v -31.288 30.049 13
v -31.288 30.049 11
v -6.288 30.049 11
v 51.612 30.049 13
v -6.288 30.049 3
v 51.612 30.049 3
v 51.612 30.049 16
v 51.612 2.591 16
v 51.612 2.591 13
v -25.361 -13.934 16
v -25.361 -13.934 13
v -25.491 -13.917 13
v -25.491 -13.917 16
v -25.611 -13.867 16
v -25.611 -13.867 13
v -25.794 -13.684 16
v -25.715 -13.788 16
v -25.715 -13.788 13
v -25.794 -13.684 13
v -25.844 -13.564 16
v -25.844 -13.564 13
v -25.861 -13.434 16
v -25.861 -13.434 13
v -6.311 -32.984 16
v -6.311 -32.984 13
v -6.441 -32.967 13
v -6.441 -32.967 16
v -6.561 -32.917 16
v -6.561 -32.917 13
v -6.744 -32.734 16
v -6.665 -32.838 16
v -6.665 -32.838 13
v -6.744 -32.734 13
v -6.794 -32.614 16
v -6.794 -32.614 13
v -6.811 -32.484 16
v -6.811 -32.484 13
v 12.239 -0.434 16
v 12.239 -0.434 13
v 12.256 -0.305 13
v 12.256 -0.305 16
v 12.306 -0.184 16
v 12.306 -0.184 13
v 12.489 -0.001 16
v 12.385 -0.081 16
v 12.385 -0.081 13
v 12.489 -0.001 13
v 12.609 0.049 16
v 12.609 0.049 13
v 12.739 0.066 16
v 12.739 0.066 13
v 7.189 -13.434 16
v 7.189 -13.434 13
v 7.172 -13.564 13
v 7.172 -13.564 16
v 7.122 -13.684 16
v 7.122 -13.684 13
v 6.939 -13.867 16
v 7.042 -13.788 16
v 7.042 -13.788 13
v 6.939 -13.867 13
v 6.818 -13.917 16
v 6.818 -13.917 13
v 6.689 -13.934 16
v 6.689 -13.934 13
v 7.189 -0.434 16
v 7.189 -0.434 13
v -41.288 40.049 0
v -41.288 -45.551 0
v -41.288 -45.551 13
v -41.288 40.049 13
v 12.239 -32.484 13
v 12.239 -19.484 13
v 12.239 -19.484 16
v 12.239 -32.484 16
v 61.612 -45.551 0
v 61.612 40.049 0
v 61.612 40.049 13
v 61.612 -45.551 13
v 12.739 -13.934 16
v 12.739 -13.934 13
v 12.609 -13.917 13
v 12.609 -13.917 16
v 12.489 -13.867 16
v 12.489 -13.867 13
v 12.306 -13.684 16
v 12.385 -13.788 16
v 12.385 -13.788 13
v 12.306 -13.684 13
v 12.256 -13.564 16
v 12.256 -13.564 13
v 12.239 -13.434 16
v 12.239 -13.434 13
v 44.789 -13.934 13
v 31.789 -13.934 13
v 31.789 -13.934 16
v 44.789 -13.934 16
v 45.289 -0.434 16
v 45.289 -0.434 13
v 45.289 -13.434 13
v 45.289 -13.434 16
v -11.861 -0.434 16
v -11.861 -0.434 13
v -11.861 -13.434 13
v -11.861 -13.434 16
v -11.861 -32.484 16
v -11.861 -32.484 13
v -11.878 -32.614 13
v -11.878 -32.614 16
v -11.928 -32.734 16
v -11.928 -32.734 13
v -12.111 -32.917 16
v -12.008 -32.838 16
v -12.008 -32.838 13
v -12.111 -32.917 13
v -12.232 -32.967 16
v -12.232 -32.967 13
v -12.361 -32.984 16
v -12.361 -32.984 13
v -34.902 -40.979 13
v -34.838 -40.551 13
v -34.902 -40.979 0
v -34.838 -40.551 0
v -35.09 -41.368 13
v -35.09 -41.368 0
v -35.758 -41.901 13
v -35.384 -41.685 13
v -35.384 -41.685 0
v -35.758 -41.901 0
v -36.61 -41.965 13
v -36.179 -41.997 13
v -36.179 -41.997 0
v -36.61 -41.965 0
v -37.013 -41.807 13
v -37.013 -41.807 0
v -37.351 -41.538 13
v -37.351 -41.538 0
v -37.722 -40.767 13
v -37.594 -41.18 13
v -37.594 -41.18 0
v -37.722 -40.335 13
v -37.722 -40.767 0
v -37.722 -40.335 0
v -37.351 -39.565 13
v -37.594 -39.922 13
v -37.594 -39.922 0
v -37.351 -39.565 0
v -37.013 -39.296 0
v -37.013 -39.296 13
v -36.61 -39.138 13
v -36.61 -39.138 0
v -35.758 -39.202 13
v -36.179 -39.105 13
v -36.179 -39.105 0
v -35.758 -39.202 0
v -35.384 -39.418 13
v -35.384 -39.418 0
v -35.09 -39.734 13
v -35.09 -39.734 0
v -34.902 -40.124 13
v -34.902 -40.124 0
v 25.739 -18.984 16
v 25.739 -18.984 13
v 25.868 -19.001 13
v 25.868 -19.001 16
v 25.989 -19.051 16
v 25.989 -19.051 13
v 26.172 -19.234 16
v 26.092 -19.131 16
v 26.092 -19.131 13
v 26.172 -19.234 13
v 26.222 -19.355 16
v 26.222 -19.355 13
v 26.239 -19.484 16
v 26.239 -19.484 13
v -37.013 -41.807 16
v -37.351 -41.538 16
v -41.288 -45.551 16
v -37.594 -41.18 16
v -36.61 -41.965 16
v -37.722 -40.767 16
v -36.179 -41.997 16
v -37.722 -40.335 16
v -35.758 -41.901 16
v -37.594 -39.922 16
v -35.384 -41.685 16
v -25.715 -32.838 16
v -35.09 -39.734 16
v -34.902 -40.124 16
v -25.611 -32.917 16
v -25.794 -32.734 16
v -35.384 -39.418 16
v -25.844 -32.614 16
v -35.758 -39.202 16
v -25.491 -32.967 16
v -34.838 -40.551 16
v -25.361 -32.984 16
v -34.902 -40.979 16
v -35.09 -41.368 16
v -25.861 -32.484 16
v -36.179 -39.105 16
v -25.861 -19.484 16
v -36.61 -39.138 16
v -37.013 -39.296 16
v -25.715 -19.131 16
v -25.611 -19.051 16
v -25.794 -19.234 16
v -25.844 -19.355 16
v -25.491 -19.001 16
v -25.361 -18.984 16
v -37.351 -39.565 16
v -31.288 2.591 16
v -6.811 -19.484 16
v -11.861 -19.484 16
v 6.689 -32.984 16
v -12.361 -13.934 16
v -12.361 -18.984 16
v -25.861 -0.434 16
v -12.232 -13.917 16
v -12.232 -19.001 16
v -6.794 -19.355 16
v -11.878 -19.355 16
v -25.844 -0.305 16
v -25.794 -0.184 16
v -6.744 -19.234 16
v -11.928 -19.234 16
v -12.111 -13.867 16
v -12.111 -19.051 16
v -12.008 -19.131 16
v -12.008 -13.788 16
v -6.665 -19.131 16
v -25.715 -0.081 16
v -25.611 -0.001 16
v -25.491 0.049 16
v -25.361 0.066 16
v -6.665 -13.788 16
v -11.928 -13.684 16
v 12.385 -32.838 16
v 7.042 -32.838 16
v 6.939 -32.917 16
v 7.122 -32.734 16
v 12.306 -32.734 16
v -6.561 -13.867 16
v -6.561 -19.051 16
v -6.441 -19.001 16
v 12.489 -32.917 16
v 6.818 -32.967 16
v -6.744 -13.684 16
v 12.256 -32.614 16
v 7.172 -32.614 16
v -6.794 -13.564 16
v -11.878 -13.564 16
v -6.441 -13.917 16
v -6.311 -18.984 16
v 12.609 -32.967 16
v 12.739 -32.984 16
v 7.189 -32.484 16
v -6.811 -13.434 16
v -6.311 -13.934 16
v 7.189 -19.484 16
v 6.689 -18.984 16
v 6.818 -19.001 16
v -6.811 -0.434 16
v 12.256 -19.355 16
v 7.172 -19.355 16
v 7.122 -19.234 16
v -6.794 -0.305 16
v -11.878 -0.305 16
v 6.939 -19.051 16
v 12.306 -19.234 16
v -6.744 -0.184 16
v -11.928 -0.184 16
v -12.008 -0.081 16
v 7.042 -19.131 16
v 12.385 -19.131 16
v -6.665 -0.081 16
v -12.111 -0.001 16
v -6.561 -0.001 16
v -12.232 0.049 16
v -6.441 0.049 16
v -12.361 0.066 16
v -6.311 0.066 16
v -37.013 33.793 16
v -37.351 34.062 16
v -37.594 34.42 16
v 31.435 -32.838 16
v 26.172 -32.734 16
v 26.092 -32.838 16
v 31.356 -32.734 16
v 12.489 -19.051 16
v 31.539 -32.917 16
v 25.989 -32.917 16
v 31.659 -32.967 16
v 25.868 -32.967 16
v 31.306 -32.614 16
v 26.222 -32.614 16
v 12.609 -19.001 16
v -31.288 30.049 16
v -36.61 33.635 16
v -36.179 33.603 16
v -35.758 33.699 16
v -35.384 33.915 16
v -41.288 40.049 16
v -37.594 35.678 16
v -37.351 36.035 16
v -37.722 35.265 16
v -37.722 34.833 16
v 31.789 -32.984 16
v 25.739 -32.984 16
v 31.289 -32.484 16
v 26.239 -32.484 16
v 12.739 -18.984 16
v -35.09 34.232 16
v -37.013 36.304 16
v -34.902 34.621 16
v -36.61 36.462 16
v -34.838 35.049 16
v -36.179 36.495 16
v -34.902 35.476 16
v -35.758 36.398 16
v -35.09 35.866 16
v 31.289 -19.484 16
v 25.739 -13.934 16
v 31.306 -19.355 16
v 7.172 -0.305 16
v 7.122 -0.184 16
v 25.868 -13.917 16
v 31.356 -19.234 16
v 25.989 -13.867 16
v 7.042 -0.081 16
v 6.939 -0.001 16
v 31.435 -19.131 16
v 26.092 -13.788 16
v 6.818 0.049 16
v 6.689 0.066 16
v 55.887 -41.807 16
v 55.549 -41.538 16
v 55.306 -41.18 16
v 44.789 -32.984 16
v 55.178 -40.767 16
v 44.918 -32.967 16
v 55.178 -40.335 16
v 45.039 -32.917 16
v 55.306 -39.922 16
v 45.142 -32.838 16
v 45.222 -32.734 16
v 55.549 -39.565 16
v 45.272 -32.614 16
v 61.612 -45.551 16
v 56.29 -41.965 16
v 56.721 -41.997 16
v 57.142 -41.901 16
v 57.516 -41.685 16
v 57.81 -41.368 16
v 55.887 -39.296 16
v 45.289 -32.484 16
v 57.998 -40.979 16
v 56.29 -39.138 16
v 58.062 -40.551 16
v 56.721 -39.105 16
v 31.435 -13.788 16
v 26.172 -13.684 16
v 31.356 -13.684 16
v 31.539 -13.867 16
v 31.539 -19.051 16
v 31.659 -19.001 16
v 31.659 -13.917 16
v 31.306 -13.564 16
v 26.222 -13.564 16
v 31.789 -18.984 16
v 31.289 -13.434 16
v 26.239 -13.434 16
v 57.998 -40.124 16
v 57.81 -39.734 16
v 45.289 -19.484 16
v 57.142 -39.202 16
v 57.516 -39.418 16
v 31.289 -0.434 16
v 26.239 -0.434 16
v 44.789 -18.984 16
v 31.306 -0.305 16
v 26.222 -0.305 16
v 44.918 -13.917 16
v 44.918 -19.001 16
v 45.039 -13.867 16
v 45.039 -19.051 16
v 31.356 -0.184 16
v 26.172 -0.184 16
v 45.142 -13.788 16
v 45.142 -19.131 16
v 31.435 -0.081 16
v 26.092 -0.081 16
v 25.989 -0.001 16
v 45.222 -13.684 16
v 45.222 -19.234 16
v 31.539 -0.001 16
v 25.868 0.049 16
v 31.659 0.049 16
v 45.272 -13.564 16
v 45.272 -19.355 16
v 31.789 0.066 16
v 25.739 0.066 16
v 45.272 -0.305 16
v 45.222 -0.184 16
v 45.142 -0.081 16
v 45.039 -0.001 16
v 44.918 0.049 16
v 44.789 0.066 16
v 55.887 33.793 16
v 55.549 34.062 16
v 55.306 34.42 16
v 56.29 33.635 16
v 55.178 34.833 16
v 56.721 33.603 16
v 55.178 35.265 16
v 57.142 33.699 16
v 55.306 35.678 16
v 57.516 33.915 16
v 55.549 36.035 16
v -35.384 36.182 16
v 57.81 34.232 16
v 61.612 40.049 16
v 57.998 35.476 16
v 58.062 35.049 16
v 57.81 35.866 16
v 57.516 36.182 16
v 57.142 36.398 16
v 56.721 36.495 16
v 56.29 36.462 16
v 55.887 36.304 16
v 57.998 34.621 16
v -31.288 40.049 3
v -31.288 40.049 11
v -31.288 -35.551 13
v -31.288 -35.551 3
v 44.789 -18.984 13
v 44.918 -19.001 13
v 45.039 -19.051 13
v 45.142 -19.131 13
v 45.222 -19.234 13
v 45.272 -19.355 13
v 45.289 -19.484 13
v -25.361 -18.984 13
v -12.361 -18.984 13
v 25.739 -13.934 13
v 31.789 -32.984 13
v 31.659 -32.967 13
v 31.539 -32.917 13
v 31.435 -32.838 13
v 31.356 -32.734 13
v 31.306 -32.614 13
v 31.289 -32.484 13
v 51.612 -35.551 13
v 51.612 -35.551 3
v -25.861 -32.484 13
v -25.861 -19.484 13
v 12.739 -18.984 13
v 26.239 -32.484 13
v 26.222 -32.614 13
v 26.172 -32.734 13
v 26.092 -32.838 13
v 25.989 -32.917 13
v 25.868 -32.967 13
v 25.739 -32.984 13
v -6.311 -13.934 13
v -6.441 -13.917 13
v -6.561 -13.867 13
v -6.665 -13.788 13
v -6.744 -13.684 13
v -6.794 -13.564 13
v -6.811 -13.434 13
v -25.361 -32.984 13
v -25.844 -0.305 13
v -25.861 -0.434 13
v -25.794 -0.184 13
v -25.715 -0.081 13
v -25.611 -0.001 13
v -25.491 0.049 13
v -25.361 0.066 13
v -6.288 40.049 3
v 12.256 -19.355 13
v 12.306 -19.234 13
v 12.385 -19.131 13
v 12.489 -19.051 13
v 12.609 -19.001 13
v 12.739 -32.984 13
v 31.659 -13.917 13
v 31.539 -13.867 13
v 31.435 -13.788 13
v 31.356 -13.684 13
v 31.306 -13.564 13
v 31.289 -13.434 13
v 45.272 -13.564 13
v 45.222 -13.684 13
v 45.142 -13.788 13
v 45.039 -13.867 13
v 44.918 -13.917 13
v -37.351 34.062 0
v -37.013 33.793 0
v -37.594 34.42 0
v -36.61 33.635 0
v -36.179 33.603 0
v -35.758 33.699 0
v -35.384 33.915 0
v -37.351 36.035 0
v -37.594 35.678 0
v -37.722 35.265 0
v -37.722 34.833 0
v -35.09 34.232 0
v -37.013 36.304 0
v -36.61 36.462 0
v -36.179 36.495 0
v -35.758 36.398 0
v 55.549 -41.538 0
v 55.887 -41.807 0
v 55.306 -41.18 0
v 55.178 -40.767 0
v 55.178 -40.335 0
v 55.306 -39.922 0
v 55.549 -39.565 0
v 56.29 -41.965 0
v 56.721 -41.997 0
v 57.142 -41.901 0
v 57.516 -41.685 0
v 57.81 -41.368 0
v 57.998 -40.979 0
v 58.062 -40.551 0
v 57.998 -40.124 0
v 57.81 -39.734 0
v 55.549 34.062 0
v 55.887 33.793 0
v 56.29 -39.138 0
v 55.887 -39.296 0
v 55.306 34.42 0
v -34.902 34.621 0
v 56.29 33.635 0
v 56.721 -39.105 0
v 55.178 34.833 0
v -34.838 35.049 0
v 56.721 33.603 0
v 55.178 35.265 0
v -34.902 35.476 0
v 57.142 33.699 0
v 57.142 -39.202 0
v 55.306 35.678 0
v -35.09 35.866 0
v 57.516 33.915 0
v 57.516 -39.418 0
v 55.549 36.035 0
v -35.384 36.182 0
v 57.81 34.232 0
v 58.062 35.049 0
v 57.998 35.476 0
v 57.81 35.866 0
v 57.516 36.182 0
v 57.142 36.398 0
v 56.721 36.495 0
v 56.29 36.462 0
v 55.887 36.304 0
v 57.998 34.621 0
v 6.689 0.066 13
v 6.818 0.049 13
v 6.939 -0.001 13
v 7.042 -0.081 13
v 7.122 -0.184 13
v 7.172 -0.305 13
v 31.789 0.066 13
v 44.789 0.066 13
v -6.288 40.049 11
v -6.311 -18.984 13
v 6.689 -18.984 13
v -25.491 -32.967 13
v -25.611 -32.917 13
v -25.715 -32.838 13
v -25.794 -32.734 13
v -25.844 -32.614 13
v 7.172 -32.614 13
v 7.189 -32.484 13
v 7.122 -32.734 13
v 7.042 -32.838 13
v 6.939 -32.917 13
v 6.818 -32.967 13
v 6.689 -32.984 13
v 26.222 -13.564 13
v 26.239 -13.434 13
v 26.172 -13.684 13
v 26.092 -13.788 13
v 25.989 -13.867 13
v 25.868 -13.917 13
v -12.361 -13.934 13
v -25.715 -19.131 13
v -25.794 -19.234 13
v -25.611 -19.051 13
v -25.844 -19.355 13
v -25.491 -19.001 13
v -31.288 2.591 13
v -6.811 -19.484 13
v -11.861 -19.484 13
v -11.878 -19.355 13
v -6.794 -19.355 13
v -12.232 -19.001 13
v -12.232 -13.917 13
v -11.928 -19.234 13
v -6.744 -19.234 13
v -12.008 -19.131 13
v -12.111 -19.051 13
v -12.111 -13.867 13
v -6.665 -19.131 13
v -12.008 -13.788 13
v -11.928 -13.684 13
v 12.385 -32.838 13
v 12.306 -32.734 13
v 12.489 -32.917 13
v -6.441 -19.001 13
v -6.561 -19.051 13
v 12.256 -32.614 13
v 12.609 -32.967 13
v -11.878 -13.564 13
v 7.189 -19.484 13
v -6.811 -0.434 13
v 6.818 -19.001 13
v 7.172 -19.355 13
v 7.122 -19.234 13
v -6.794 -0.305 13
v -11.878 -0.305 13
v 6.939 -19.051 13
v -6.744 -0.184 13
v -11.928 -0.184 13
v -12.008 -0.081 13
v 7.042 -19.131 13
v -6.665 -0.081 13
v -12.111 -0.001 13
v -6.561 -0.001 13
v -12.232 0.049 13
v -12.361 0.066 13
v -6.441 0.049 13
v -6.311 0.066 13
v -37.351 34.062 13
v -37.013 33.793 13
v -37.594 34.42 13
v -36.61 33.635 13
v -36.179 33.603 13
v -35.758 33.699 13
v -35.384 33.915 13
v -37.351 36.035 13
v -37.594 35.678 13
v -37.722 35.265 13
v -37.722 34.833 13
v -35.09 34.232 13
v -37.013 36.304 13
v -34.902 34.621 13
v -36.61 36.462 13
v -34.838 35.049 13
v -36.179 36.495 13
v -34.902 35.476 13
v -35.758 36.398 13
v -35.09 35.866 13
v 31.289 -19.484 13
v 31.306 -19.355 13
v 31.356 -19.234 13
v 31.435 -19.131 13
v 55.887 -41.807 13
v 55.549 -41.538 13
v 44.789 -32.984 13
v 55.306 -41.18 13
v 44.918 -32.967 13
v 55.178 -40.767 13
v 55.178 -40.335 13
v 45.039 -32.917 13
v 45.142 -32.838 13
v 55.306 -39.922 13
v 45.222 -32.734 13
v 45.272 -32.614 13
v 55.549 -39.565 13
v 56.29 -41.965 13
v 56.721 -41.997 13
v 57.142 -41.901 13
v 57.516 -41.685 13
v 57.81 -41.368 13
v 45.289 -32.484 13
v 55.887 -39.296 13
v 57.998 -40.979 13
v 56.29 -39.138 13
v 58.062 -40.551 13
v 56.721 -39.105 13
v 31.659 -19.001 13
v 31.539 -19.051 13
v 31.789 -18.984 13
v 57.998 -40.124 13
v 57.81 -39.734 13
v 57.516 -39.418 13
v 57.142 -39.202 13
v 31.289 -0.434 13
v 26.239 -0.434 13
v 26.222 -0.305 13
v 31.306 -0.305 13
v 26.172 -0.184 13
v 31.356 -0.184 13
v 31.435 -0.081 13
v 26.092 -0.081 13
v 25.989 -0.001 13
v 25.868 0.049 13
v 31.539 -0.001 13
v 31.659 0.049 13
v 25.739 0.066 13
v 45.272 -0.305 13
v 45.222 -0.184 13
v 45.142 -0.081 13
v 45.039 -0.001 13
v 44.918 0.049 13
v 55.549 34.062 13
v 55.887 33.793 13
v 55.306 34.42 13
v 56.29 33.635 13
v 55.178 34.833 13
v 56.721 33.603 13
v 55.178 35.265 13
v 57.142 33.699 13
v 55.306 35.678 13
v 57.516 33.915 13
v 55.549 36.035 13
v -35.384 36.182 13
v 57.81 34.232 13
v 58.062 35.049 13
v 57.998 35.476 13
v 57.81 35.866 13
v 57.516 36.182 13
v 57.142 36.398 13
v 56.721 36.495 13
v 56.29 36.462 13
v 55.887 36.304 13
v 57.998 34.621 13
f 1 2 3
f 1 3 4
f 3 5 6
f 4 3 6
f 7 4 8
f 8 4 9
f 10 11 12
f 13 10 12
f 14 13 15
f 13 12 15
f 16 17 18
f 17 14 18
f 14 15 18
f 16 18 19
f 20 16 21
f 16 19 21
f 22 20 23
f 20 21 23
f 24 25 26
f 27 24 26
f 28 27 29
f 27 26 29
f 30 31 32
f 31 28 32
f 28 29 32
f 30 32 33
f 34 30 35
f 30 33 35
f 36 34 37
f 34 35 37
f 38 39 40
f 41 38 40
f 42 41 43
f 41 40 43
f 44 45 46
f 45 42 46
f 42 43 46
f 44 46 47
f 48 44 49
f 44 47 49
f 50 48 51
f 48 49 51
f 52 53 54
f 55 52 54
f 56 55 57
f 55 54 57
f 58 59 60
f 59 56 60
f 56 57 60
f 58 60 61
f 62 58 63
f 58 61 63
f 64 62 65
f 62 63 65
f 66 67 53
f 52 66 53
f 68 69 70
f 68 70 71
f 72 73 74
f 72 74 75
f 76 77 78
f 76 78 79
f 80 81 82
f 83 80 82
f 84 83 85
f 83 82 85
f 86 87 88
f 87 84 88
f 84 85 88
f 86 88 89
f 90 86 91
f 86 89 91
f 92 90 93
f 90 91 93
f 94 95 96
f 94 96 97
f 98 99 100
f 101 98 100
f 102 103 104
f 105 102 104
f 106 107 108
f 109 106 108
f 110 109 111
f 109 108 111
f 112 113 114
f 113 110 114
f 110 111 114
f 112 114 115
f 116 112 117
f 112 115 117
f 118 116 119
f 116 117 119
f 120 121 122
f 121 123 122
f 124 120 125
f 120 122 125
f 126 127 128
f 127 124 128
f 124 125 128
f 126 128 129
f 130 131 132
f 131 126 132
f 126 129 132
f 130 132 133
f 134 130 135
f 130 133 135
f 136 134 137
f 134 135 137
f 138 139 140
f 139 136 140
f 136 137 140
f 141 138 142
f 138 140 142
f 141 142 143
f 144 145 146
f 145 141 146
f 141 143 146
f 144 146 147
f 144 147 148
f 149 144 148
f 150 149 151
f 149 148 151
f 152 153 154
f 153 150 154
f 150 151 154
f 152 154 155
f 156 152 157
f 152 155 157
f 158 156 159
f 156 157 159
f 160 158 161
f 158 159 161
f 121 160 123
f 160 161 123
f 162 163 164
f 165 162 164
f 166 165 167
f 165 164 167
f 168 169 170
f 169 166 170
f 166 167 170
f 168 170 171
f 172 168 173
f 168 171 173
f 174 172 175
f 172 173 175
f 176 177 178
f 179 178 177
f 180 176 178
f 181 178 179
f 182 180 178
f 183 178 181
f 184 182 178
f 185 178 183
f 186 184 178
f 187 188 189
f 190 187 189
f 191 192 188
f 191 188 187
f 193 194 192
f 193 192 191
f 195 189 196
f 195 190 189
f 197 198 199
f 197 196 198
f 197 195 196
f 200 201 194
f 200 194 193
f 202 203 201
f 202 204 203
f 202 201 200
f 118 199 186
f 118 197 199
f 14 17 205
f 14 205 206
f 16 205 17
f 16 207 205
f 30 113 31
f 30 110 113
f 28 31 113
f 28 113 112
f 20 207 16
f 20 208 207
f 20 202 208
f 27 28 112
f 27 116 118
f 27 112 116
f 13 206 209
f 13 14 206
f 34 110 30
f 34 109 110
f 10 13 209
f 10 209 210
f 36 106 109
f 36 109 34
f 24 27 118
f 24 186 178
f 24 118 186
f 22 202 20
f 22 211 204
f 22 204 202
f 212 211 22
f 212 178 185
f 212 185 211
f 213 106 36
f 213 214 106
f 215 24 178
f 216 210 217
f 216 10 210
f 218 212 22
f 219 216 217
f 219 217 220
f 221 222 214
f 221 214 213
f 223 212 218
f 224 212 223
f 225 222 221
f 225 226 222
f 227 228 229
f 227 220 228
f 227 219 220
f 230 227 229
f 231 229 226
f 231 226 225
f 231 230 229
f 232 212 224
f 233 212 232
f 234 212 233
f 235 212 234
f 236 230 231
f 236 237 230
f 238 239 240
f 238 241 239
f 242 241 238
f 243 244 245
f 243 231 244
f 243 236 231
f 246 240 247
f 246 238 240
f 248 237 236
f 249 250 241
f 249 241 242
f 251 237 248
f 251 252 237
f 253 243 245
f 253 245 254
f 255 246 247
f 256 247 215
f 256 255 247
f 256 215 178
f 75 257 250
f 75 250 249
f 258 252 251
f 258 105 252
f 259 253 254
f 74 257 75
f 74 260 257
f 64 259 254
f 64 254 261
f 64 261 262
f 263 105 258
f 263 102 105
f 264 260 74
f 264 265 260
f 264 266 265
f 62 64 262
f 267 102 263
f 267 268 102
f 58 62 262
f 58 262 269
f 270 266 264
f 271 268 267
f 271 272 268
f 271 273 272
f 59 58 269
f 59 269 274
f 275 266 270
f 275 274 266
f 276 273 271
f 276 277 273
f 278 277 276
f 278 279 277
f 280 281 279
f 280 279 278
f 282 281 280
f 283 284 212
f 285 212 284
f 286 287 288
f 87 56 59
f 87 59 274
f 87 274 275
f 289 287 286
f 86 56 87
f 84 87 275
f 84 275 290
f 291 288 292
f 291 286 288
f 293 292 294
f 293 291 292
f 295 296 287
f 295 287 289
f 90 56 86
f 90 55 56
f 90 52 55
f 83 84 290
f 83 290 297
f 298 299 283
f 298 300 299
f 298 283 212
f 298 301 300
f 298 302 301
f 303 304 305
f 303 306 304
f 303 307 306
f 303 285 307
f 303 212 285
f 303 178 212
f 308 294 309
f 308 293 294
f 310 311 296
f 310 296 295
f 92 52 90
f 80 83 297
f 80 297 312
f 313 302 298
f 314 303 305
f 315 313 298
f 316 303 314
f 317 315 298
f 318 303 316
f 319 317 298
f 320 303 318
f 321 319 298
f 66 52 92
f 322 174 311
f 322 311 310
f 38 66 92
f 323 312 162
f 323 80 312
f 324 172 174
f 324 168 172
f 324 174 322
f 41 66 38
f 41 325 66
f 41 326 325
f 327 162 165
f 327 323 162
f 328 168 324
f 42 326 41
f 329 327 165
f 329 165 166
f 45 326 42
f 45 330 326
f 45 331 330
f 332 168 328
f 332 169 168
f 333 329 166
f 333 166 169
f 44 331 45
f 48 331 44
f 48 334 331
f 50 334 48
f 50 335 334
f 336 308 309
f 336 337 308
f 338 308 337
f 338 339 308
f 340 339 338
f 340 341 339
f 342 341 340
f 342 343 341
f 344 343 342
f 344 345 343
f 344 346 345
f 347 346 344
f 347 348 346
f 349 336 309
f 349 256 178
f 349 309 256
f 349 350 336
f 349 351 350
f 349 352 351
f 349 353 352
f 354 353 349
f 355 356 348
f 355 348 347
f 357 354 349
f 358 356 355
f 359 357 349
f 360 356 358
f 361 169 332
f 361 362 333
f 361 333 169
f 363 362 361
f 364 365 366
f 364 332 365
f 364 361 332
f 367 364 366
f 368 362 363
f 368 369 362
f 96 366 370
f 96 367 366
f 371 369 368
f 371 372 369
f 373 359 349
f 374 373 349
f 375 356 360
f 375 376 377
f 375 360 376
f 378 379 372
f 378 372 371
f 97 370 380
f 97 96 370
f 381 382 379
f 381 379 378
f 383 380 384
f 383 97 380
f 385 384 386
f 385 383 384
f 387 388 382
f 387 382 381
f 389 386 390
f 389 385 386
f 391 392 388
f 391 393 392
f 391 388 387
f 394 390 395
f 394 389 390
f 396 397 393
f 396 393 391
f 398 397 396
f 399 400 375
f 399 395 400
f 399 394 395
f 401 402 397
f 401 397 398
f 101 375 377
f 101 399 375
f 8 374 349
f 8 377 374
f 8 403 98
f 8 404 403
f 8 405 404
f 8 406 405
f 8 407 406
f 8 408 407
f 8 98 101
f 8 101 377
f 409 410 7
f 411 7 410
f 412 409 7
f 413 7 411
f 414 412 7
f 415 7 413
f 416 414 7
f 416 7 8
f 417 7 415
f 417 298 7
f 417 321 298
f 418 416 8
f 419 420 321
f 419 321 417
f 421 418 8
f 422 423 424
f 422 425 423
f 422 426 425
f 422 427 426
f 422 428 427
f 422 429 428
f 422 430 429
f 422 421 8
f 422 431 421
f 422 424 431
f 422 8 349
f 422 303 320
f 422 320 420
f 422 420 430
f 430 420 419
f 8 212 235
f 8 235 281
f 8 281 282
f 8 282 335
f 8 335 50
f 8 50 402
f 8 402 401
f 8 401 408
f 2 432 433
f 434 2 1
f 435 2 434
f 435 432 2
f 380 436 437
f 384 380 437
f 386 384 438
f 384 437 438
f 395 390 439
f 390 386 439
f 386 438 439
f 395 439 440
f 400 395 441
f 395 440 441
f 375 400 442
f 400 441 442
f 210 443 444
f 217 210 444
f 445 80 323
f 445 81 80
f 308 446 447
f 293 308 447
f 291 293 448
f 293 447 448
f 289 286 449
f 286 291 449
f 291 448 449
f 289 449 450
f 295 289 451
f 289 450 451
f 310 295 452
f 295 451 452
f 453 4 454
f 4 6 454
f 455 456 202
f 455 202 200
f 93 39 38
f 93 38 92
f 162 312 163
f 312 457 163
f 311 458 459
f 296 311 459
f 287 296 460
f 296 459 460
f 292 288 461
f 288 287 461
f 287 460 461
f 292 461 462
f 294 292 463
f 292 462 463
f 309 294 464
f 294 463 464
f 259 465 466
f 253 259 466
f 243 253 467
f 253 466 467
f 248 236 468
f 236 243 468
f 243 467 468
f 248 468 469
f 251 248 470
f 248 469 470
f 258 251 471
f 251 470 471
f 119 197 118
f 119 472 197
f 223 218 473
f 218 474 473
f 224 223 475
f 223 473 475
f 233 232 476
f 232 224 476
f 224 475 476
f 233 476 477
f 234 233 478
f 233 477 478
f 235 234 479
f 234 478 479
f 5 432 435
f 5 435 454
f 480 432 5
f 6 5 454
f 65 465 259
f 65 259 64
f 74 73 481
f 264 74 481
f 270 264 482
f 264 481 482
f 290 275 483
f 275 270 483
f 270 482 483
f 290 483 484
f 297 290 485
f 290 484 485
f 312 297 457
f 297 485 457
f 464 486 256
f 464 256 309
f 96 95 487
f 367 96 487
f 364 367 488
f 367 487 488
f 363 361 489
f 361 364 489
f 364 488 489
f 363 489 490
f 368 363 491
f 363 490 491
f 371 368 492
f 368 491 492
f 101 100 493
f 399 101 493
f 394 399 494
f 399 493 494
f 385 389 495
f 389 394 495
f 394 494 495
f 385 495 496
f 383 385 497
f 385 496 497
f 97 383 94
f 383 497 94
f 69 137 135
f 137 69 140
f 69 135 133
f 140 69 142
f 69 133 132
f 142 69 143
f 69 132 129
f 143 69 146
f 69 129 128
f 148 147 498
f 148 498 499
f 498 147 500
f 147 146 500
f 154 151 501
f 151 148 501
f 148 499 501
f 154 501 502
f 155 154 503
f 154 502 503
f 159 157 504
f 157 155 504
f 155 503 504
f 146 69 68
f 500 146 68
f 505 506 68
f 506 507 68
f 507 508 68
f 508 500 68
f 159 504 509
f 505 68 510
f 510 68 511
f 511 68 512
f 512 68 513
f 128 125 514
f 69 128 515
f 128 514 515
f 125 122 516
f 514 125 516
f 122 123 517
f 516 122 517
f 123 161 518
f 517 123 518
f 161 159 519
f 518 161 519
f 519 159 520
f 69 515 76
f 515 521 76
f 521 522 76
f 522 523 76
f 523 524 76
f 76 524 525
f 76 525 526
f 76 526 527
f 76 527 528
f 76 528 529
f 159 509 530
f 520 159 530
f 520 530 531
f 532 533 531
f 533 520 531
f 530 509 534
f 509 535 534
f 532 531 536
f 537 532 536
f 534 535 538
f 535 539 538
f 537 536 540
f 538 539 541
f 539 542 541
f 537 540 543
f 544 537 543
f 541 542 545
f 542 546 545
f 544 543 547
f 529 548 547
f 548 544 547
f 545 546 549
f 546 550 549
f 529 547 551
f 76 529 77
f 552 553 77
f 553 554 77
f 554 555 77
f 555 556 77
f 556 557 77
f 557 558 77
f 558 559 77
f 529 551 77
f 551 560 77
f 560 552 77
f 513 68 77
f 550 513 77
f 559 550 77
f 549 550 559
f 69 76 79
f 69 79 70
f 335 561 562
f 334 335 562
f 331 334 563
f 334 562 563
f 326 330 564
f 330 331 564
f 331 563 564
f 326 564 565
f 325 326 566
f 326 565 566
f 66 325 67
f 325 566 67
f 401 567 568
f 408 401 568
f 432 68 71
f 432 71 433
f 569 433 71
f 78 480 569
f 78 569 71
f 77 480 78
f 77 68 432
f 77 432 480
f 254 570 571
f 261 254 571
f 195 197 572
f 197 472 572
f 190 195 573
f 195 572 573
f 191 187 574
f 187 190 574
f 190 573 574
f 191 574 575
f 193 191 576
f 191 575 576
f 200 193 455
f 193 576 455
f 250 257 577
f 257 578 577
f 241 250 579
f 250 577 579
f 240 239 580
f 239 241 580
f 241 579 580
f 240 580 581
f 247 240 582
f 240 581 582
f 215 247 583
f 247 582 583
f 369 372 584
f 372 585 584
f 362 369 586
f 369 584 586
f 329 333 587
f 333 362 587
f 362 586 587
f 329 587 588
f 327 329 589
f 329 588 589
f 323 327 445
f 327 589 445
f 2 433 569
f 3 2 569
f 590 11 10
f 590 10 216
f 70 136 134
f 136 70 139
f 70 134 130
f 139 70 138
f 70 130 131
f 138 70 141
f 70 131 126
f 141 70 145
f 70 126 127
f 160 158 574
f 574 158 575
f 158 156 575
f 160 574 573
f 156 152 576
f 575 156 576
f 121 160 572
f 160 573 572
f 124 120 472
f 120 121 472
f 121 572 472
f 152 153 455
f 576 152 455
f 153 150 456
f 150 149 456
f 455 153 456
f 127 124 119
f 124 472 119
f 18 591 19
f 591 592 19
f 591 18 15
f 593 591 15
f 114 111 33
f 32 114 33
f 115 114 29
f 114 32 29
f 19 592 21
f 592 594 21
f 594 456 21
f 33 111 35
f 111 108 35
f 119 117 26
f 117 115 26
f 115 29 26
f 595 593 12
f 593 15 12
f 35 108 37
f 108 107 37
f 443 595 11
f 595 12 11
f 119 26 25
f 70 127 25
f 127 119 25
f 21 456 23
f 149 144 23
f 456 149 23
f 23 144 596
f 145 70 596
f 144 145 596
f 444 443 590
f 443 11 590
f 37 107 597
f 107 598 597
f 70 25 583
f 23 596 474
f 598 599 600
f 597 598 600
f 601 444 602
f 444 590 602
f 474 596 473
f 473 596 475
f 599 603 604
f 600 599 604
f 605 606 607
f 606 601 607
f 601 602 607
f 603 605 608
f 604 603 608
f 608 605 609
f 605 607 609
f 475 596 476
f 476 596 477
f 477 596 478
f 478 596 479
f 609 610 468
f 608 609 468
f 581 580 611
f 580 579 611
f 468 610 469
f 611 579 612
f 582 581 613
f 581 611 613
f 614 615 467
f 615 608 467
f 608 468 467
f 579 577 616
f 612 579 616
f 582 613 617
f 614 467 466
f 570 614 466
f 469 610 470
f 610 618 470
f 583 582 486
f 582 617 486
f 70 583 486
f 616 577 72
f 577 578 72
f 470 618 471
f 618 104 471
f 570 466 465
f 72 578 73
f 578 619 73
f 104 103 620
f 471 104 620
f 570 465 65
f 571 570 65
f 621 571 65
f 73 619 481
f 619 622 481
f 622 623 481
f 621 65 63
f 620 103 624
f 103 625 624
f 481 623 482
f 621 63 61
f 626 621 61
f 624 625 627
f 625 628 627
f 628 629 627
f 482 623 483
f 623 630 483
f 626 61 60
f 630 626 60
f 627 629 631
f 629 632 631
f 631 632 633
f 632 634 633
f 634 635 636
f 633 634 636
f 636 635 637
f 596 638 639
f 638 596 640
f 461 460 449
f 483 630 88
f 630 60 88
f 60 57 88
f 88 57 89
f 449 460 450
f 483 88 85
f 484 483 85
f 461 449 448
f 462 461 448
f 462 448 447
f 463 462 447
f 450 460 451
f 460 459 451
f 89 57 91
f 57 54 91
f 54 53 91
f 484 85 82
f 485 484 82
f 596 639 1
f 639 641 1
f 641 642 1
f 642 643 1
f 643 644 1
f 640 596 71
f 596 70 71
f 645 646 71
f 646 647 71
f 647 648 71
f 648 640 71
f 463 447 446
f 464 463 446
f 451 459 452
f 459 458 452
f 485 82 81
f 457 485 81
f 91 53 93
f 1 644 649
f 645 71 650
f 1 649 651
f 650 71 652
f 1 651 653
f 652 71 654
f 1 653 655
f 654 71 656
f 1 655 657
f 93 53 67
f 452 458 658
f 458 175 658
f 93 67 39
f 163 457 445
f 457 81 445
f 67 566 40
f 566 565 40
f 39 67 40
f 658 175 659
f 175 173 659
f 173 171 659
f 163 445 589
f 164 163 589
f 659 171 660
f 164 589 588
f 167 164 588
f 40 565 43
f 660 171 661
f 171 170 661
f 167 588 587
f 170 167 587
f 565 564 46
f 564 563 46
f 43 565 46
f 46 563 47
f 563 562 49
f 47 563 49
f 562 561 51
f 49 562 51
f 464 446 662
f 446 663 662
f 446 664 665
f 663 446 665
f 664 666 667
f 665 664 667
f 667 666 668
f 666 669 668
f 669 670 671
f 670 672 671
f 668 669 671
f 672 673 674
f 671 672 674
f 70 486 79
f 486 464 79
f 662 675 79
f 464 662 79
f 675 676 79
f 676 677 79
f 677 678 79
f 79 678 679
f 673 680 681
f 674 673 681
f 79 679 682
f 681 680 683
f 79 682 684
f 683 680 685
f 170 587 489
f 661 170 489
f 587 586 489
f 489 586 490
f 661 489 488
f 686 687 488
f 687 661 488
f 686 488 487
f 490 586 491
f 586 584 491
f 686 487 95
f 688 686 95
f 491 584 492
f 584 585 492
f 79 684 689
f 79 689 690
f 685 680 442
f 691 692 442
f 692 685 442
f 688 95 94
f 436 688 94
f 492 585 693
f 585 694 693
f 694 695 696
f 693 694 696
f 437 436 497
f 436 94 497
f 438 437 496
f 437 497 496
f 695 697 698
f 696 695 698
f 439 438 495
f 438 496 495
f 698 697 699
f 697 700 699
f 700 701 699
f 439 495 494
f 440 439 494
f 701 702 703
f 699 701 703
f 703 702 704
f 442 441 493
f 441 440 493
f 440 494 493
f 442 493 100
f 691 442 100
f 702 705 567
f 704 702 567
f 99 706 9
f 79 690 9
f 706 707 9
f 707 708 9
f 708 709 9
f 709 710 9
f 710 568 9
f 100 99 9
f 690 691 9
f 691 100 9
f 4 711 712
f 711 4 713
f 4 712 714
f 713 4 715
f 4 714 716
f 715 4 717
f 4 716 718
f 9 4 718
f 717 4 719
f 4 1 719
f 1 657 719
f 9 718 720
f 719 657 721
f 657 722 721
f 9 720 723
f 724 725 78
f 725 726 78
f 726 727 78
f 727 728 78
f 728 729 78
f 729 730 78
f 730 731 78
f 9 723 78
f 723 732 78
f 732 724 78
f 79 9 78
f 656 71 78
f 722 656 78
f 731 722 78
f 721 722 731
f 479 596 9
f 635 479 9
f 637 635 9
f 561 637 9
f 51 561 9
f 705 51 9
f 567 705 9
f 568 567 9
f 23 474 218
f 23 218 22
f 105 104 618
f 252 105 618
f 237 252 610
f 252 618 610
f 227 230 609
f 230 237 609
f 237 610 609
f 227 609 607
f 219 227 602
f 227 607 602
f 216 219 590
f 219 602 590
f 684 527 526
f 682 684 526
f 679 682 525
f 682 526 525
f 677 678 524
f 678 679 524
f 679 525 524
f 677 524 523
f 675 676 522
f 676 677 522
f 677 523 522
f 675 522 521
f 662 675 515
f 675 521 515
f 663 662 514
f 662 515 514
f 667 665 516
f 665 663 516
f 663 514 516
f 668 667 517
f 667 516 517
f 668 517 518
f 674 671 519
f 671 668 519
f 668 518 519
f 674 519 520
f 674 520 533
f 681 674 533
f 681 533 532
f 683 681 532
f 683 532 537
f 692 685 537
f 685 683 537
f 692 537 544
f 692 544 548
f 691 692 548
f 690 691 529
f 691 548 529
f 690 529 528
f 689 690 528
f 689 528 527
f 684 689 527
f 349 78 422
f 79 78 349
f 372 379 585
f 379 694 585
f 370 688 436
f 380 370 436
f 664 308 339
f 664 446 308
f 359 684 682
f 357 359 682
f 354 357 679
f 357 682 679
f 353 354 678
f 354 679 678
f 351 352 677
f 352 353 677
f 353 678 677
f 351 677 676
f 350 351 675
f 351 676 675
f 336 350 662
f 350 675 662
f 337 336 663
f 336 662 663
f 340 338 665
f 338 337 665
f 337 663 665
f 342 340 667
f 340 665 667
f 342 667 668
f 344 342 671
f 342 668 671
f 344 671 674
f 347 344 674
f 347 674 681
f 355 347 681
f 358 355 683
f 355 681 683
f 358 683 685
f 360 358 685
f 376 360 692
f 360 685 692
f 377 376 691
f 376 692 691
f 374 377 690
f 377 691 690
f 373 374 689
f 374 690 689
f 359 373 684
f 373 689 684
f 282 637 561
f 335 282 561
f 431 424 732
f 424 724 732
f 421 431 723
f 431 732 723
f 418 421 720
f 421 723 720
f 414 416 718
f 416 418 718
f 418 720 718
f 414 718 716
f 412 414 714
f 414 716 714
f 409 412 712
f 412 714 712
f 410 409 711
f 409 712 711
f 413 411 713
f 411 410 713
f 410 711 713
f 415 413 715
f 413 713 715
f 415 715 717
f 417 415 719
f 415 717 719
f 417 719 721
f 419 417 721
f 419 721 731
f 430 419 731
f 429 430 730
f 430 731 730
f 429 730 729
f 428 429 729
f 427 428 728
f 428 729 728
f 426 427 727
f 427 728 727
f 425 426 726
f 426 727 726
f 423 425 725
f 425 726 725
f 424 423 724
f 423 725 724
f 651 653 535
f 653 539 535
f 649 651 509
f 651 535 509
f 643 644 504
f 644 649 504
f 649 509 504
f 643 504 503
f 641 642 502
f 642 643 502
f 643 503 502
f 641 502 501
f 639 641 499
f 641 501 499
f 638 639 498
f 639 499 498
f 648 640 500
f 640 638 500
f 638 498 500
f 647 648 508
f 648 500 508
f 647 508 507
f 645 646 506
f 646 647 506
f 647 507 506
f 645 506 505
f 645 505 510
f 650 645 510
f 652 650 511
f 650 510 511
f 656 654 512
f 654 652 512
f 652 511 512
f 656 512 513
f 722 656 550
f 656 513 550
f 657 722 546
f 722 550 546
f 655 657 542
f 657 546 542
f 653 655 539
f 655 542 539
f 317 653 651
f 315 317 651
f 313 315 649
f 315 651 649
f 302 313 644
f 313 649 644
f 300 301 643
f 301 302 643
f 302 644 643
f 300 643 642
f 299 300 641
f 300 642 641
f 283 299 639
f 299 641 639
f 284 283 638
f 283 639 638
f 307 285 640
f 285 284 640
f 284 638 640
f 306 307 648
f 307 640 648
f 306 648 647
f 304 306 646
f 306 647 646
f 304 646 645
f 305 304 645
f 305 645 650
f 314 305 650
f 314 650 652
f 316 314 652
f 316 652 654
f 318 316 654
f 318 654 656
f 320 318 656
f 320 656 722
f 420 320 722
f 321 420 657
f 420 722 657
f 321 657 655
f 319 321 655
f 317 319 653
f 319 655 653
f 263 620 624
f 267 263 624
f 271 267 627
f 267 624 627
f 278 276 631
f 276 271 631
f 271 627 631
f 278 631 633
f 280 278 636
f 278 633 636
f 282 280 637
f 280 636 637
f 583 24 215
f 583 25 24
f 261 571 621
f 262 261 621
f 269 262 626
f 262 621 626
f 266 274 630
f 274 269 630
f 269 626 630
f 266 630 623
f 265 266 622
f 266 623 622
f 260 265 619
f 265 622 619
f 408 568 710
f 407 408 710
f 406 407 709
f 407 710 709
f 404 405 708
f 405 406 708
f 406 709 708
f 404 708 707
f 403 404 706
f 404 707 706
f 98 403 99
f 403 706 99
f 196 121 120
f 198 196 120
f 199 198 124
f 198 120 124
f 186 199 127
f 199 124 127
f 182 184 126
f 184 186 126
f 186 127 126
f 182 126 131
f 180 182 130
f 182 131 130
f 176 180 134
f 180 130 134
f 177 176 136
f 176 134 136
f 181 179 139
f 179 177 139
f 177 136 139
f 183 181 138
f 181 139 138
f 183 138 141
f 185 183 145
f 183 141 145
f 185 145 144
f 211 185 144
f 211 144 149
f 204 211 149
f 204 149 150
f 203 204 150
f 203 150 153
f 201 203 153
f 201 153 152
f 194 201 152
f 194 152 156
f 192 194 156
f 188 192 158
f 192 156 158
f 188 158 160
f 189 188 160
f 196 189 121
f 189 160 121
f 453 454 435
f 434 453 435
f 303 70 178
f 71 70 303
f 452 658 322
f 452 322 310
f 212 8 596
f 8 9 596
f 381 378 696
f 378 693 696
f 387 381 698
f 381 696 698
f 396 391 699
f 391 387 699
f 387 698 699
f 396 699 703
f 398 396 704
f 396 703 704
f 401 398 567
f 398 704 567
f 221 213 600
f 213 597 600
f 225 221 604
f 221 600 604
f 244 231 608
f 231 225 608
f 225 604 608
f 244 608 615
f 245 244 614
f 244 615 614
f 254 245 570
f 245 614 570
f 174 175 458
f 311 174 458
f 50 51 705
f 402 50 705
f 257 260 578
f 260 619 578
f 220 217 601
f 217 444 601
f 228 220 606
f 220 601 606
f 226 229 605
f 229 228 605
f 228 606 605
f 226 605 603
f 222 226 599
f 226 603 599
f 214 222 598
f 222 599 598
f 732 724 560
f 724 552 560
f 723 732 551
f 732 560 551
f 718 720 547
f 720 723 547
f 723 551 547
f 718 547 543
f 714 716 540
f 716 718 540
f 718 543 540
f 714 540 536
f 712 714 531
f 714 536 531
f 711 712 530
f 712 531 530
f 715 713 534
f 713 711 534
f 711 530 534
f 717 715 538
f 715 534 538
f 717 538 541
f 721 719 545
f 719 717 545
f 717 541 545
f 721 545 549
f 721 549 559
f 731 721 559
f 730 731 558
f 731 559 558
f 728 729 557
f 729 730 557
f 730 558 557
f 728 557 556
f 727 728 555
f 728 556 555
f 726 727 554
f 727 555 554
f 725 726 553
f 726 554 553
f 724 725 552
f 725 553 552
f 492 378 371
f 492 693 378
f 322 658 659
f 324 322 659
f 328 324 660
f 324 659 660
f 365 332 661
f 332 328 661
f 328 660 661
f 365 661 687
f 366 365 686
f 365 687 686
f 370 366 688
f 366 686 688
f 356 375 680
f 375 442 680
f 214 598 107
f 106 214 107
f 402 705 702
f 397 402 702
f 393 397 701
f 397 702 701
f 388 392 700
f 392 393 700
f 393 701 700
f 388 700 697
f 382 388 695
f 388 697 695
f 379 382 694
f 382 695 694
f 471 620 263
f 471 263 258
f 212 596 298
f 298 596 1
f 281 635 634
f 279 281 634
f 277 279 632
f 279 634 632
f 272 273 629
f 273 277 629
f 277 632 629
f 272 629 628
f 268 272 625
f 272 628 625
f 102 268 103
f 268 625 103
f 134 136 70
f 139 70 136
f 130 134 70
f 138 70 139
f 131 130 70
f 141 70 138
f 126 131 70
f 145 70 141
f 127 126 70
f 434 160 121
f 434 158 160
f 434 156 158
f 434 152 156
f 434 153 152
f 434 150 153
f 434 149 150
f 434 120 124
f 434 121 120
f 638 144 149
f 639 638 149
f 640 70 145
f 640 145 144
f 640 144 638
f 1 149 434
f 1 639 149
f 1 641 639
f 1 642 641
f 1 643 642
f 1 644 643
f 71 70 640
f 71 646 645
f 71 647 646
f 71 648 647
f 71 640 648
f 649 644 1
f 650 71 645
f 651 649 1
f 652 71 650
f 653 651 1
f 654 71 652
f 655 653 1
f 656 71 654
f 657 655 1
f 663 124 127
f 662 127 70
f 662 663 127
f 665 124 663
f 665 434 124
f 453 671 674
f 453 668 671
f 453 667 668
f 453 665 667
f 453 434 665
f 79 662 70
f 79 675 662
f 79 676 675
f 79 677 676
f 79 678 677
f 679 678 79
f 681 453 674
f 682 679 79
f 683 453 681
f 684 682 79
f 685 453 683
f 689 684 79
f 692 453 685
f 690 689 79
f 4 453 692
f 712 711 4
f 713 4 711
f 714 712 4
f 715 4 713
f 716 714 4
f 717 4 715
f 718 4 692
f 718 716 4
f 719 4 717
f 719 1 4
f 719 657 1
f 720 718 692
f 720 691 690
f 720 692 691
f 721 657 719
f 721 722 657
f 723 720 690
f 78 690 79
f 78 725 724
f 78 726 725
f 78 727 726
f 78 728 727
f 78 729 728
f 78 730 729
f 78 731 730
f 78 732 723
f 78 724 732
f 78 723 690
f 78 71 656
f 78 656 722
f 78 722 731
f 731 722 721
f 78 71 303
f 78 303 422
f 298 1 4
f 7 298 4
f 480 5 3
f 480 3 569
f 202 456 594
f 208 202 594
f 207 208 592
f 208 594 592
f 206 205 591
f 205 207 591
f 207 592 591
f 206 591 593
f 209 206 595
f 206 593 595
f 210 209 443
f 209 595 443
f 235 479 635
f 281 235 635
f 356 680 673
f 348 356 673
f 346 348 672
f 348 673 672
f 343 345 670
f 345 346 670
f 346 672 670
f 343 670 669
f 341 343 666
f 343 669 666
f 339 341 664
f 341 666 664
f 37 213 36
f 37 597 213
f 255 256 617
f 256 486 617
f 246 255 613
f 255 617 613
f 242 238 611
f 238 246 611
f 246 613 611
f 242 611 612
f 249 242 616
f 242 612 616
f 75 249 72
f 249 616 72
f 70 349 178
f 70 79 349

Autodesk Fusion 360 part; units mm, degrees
sketch "Sketch2" plane through (0, 0, 0) normal (0, 0, 1) x (1, 0, 0)
  line L0 (-31.2878, 30.0487) -> (51.6122, 30.0487)
  line L1 (51.6122, 30.0487) -> (51.6122, -35.5513)
  line L2 (51.6122, -35.5513) -> (-31.2878, -35.5513)
  line L3 (-31.2878, -35.5513) -> (-31.2878, 30.0487)
  line L4 (-41.2878, 40.0487) -> (61.6122, 40.0487)
  line L5 (61.6122, 40.0487) -> (61.6122, -45.5513)
  line L6 (61.6122, -45.5513) -> (-41.2878, -45.5513)
  line L7 (-41.2878, -45.5513) -> (-41.2878, 40.0487)
  circle A0 centre (-36.2878, 35.0487) radius 1.45
  circle A1 centre (56.6122, 35.0487) radius 1.45
  circle A2 centre (56.6122, -40.5513) radius 1.45
  circle A3 centre (-36.2878, -40.5513) radius 1.45
  line L8 (-25.3614, 0.0659) -> (-12.3614, 0.0659)
  line L9 (-25.3614, -13.9341) -> (-12.3614, -13.9341)
  line L10 (-25.8614, -0.4341) -> (-25.8614, -13.4341)
  line L11 (-11.8614, -0.4341) -> (-11.8614, -13.4341)
  arc A4 (-25.3614, 0.0659) -> (-25.8614, -0.4341) centre (-25.3614, -0.4341) ccw
  arc A5 (-11.8614, -0.4341) -> (-12.3614, 0.0659) centre (-12.3614, -0.4341) ccw
  arc A6 (-25.8614, -13.4341) -> (-25.3614, -13.9341) centre (-25.3614, -13.4341) ccw
  arc A7 (-12.3614, -13.9341) -> (-11.8614, -13.4341) centre (-12.3614, -13.4341) ccw
  line L12 (-6.3114, 0.0659) -> (6.6886, 0.0659)
  line L13 (-6.3114, -13.9341) -> (6.6886, -13.9341)
  line L14 (-6.8114, -0.4341) -> (-6.8114, -13.4341)
  line L15 (7.1886, -0.4341) -> (7.1886, -13.4341)
  arc A8 (-6.3114, 0.0659) -> (-6.8114, -0.4341) centre (-6.3114, -0.4341) ccw
  arc A9 (7.1886, -0.4341) -> (6.6886, 0.0659) centre (6.6886, -0.4341) ccw
  arc A10 (-6.8114, -13.4341) -> (-6.3114, -13.9341) centre (-6.3114, -13.4341) ccw
  arc A11 (6.6886, -13.9341) -> (7.1886, -13.4341) centre (6.6886, -13.4341) ccw
  line L16 (12.7386, 0.0659) -> (25.7386, 0.0659)
  line L17 (12.7386, -13.9341) -> (25.7386, -13.9341)
  line L18 (12.2386, -0.4341) -> (12.2386, -13.4341)
  line L19 (26.2386, -0.4341) -> (26.2386, -13.4341)
  arc A12 (12.7386, 0.0659) -> (12.2386, -0.4341) centre (12.7386, -0.4341) ccw
  arc A13 (26.2386, -0.4341) -> (25.7386, 0.0659) centre (25.7386, -0.4341) ccw
  arc A14 (12.2386, -13.4341) -> (12.7386, -13.9341) centre (12.7386, -13.4341) ccw
  arc A15 (25.7386, -13.9341) -> (26.2386, -13.4341) centre (25.7386, -13.4341) ccw
  line L20 (31.7886, 0.0659) -> (44.7886, 0.0659)
  line L21 (31.7886, -13.9341) -> (44.7886, -13.9341)
  line L22 (31.2886, -0.4341) -> (31.2886, -13.4341)
  line L23 (45.2886, -0.4341) -> (45.2886, -13.4341)
  arc A16 (31.7886, 0.0659) -> (31.2886, -0.4341) centre (31.7886, -0.4341) ccw
  arc A17 (45.2886, -0.4341) -> (44.7886, 0.0659) centre (44.7886, -0.4341) ccw
  arc A18 (31.2886, -13.4341) -> (31.7886, -13.9341) centre (31.7886, -13.4341) ccw
  arc A19 (44.7886, -13.9341) -> (45.2886, -13.4341) centre (44.7886, -13.4341) ccw
  line L24 (-25.3614, -18.9841) -> (-12.3614, -18.9841)
  line L25 (-25.3614, -32.9841) -> (-12.3614, -32.9841)
  line L26 (-25.8614, -19.4841) -> (-25.8614, -32.4841)
  line L27 (-11.8614, -19.4841) -> (-11.8614, -32.4841)
  arc A20 (-25.3614, -18.9841) -> (-25.8614, -19.4841) centre (-25.3614, -19.4841) ccw
  arc A21 (-11.8614, -19.4841) -> (-12.3614, -18.9841) centre (-12.3614, -19.4841) ccw
  arc A22 (-25.8614, -32.4841) -> (-25.3614, -32.9841) centre (-25.3614, -32.4841) ccw
  arc A23 (-12.3614, -32.9841) -> (-11.8614, -32.4841) centre (-12.3614, -32.4841) ccw
  line L28 (-6.3114, -18.9841) -> (6.6886, -18.9841)
  line L29 (-6.3114, -32.9841) -> (6.6886, -32.9841)
  line L30 (-6.8114, -19.4841) -> (-6.8114, -32.4841)
  line L31 (7.1886, -19.4841) -> (7.1886, -32.4841)
  arc A24 (-6.3114, -18.9841) -> (-6.8114, -19.4841) centre (-6.3114, -19.4841) ccw
  arc A25 (7.1886, -19.4841) -> (6.6886, -18.9841) centre (6.6886, -19.4841) ccw
  arc A26 (-6.8114, -32.4841) -> (-6.3114, -32.9841) centre (-6.3114, -32.4841) ccw
  arc A27 (6.6886, -32.9841) -> (7.1886, -32.4841) centre (6.6886, -32.4841) ccw
  line L32 (12.7386, -18.9841) -> (25.7386, -18.9841)
  line L33 (12.7386, -32.9841) -> (25.7386, -32.9841)
  line L34 (12.2386, -19.4841) -> (12.2386, -32.4841)
  line L35 (26.2386, -19.4841) -> (26.2386, -32.4841)
  arc A28 (12.7386, -18.9841) -> (12.2386, -19.4841) centre (12.7386, -19.4841) ccw
  arc A29 (26.2386, -19.4841) -> (25.7386, -18.9841) centre (25.7386, -19.4841) ccw
  arc A30 (12.2386, -32.4841) -> (12.7386, -32.9841) centre (12.7386, -32.4841) ccw
  arc A31 (25.7386, -32.9841) -> (26.2386, -32.4841) centre (25.7386, -32.4841) ccw
  line L36 (31.7886, -18.9841) -> (44.7886, -18.9841)
  line L37 (31.7886, -32.9841) -> (44.7886, -32.9841)
  line L38 (31.2886, -19.4841) -> (31.2886, -32.4841)
  line L39 (45.2886, -19.4841) -> (45.2886, -32.4841)
  arc A32 (31.7886, -18.9841) -> (31.2886, -19.4841) centre (31.7886, -19.4841) ccw
  arc A33 (45.2886, -19.4841) -> (44.7886, -18.9841) centre (44.7886, -19.4841) ccw
  arc A34 (31.2886, -32.4841) -> (31.7886, -32.9841) centre (31.7886, -32.4841) ccw
  arc A35 (44.7886, -32.9841) -> (45.2886, -32.4841) centre (44.7886, -32.4841) ccw
  line L40 (-28.3864, -35.5091) -> (47.8136, -35.5091)
  line L41 (-28.3864, 2.5909) -> (47.8136, 2.5909)
  line L42 (-28.3864, -35.5091) -> (-28.3864, 2.5909)
  line L43 (47.8136, -35.5091) -> (47.8136, 2.5909)
  line L44 (-31.2878, 30.0487) -> (51.6122, 30.0487)
  line L45 (51.6122, 30.0487) -> (51.6122, 2.5909)
  line L46 (51.6122, 2.5909) -> (-31.2878, 2.5909)
  line L47 (-31.2878, 2.5909) -> (-31.2878, 30.0487)
  line L48 (-31.2878, 30.0487) -> (-6.2878, 30.0487)
  line L49 (-6.2878, 30.0487) -> (-6.2878, 40.0487)
  line L50 (-6.2878, 40.0487) -> (-31.2878, 40.0487)
  line L51 (-31.2878, 40.0487) -> (-31.2878, 30.0487)
  dimension "d3" = 65.6
  dimension "d4" = 82.9
  dimension "d5" = 10
  dimension "d6" = 10
  dimension "d7" = 10
  dimension "d8" = 10
  dimension "d9" = 2.9
  dimension "d10" = 5
  dimension "d11" = 5
  dimension "d12" = 2.9
  dimension "d13" = 5
  dimension "d14" = 5
  dimension "d15" = 2.9
  dimension "d16" = 5
  dimension "d17" = 5
  dimension "d18" = 2.9
  dimension "d19" = 5
  dimension "d20" = 5
  dimension "d32" = 25
extrude "Extrude1" add sketch "Sketch2" along normal blind 3 contours L0 L4 L44 L48 L49 L50 L51 | L0 L1 L3 L41 L44 L45 L46 L47 L48 | L0 L1 L2 L3 L4 L5 L6 L7 L44 L45 L47 L49 L51 | L1 L2 L3 L40 L42 L43 L46 | L40 L41 L42 L43 L46 | L8 L9 L10 L11 A4 A5 A6 A7 | L12 L13 L14 L15 A8 A9 A10 A11 | L16 L17 L18 L19 A12 A13 A14 A15 | L20 L21 L22 L23 A16 A17 A18 A19 | L24 L25 L26 L27 A20 A21 A22 A23 | L28 L29 L30 L31 A24 A25 A26 A27 | L32 L33 L34 L35 A28 A29 A30 A31 | L36 L37 L38 L39 A32 A33 A34 A35 makes body 1
extrude "Extrude2" add sketch "Sketch2" along normal blind 10 from surface at 3 contours L0 L4 L44 L48 L49 L50 L51 | L0 L1 L2 L3 L4 L5 L6 L7 L44 L45 L47 L49 L51 bodies 1
extrude "Extrude3" add sketch "Sketch2" along normal blind 3 from surface at 13 separate body makes body 2
extrude "Extrude4" add sketch "Sketch2" along normal blind 3 from surface at 13 separate body contours L0 L1 L3 L41 L44 L45 L46 L47 L48 makes body 3
combine "Combine1" operation cut target body 2 tool bodies 3
extrude "Extrude5" add sketch "Sketch2" along normal blind 8 from surface at 3 separate body contours L0 L4 L44 L48 L49 L50 L51 makes body 4
combine "Combine2" operation cut target body 1 tool bodies 4
